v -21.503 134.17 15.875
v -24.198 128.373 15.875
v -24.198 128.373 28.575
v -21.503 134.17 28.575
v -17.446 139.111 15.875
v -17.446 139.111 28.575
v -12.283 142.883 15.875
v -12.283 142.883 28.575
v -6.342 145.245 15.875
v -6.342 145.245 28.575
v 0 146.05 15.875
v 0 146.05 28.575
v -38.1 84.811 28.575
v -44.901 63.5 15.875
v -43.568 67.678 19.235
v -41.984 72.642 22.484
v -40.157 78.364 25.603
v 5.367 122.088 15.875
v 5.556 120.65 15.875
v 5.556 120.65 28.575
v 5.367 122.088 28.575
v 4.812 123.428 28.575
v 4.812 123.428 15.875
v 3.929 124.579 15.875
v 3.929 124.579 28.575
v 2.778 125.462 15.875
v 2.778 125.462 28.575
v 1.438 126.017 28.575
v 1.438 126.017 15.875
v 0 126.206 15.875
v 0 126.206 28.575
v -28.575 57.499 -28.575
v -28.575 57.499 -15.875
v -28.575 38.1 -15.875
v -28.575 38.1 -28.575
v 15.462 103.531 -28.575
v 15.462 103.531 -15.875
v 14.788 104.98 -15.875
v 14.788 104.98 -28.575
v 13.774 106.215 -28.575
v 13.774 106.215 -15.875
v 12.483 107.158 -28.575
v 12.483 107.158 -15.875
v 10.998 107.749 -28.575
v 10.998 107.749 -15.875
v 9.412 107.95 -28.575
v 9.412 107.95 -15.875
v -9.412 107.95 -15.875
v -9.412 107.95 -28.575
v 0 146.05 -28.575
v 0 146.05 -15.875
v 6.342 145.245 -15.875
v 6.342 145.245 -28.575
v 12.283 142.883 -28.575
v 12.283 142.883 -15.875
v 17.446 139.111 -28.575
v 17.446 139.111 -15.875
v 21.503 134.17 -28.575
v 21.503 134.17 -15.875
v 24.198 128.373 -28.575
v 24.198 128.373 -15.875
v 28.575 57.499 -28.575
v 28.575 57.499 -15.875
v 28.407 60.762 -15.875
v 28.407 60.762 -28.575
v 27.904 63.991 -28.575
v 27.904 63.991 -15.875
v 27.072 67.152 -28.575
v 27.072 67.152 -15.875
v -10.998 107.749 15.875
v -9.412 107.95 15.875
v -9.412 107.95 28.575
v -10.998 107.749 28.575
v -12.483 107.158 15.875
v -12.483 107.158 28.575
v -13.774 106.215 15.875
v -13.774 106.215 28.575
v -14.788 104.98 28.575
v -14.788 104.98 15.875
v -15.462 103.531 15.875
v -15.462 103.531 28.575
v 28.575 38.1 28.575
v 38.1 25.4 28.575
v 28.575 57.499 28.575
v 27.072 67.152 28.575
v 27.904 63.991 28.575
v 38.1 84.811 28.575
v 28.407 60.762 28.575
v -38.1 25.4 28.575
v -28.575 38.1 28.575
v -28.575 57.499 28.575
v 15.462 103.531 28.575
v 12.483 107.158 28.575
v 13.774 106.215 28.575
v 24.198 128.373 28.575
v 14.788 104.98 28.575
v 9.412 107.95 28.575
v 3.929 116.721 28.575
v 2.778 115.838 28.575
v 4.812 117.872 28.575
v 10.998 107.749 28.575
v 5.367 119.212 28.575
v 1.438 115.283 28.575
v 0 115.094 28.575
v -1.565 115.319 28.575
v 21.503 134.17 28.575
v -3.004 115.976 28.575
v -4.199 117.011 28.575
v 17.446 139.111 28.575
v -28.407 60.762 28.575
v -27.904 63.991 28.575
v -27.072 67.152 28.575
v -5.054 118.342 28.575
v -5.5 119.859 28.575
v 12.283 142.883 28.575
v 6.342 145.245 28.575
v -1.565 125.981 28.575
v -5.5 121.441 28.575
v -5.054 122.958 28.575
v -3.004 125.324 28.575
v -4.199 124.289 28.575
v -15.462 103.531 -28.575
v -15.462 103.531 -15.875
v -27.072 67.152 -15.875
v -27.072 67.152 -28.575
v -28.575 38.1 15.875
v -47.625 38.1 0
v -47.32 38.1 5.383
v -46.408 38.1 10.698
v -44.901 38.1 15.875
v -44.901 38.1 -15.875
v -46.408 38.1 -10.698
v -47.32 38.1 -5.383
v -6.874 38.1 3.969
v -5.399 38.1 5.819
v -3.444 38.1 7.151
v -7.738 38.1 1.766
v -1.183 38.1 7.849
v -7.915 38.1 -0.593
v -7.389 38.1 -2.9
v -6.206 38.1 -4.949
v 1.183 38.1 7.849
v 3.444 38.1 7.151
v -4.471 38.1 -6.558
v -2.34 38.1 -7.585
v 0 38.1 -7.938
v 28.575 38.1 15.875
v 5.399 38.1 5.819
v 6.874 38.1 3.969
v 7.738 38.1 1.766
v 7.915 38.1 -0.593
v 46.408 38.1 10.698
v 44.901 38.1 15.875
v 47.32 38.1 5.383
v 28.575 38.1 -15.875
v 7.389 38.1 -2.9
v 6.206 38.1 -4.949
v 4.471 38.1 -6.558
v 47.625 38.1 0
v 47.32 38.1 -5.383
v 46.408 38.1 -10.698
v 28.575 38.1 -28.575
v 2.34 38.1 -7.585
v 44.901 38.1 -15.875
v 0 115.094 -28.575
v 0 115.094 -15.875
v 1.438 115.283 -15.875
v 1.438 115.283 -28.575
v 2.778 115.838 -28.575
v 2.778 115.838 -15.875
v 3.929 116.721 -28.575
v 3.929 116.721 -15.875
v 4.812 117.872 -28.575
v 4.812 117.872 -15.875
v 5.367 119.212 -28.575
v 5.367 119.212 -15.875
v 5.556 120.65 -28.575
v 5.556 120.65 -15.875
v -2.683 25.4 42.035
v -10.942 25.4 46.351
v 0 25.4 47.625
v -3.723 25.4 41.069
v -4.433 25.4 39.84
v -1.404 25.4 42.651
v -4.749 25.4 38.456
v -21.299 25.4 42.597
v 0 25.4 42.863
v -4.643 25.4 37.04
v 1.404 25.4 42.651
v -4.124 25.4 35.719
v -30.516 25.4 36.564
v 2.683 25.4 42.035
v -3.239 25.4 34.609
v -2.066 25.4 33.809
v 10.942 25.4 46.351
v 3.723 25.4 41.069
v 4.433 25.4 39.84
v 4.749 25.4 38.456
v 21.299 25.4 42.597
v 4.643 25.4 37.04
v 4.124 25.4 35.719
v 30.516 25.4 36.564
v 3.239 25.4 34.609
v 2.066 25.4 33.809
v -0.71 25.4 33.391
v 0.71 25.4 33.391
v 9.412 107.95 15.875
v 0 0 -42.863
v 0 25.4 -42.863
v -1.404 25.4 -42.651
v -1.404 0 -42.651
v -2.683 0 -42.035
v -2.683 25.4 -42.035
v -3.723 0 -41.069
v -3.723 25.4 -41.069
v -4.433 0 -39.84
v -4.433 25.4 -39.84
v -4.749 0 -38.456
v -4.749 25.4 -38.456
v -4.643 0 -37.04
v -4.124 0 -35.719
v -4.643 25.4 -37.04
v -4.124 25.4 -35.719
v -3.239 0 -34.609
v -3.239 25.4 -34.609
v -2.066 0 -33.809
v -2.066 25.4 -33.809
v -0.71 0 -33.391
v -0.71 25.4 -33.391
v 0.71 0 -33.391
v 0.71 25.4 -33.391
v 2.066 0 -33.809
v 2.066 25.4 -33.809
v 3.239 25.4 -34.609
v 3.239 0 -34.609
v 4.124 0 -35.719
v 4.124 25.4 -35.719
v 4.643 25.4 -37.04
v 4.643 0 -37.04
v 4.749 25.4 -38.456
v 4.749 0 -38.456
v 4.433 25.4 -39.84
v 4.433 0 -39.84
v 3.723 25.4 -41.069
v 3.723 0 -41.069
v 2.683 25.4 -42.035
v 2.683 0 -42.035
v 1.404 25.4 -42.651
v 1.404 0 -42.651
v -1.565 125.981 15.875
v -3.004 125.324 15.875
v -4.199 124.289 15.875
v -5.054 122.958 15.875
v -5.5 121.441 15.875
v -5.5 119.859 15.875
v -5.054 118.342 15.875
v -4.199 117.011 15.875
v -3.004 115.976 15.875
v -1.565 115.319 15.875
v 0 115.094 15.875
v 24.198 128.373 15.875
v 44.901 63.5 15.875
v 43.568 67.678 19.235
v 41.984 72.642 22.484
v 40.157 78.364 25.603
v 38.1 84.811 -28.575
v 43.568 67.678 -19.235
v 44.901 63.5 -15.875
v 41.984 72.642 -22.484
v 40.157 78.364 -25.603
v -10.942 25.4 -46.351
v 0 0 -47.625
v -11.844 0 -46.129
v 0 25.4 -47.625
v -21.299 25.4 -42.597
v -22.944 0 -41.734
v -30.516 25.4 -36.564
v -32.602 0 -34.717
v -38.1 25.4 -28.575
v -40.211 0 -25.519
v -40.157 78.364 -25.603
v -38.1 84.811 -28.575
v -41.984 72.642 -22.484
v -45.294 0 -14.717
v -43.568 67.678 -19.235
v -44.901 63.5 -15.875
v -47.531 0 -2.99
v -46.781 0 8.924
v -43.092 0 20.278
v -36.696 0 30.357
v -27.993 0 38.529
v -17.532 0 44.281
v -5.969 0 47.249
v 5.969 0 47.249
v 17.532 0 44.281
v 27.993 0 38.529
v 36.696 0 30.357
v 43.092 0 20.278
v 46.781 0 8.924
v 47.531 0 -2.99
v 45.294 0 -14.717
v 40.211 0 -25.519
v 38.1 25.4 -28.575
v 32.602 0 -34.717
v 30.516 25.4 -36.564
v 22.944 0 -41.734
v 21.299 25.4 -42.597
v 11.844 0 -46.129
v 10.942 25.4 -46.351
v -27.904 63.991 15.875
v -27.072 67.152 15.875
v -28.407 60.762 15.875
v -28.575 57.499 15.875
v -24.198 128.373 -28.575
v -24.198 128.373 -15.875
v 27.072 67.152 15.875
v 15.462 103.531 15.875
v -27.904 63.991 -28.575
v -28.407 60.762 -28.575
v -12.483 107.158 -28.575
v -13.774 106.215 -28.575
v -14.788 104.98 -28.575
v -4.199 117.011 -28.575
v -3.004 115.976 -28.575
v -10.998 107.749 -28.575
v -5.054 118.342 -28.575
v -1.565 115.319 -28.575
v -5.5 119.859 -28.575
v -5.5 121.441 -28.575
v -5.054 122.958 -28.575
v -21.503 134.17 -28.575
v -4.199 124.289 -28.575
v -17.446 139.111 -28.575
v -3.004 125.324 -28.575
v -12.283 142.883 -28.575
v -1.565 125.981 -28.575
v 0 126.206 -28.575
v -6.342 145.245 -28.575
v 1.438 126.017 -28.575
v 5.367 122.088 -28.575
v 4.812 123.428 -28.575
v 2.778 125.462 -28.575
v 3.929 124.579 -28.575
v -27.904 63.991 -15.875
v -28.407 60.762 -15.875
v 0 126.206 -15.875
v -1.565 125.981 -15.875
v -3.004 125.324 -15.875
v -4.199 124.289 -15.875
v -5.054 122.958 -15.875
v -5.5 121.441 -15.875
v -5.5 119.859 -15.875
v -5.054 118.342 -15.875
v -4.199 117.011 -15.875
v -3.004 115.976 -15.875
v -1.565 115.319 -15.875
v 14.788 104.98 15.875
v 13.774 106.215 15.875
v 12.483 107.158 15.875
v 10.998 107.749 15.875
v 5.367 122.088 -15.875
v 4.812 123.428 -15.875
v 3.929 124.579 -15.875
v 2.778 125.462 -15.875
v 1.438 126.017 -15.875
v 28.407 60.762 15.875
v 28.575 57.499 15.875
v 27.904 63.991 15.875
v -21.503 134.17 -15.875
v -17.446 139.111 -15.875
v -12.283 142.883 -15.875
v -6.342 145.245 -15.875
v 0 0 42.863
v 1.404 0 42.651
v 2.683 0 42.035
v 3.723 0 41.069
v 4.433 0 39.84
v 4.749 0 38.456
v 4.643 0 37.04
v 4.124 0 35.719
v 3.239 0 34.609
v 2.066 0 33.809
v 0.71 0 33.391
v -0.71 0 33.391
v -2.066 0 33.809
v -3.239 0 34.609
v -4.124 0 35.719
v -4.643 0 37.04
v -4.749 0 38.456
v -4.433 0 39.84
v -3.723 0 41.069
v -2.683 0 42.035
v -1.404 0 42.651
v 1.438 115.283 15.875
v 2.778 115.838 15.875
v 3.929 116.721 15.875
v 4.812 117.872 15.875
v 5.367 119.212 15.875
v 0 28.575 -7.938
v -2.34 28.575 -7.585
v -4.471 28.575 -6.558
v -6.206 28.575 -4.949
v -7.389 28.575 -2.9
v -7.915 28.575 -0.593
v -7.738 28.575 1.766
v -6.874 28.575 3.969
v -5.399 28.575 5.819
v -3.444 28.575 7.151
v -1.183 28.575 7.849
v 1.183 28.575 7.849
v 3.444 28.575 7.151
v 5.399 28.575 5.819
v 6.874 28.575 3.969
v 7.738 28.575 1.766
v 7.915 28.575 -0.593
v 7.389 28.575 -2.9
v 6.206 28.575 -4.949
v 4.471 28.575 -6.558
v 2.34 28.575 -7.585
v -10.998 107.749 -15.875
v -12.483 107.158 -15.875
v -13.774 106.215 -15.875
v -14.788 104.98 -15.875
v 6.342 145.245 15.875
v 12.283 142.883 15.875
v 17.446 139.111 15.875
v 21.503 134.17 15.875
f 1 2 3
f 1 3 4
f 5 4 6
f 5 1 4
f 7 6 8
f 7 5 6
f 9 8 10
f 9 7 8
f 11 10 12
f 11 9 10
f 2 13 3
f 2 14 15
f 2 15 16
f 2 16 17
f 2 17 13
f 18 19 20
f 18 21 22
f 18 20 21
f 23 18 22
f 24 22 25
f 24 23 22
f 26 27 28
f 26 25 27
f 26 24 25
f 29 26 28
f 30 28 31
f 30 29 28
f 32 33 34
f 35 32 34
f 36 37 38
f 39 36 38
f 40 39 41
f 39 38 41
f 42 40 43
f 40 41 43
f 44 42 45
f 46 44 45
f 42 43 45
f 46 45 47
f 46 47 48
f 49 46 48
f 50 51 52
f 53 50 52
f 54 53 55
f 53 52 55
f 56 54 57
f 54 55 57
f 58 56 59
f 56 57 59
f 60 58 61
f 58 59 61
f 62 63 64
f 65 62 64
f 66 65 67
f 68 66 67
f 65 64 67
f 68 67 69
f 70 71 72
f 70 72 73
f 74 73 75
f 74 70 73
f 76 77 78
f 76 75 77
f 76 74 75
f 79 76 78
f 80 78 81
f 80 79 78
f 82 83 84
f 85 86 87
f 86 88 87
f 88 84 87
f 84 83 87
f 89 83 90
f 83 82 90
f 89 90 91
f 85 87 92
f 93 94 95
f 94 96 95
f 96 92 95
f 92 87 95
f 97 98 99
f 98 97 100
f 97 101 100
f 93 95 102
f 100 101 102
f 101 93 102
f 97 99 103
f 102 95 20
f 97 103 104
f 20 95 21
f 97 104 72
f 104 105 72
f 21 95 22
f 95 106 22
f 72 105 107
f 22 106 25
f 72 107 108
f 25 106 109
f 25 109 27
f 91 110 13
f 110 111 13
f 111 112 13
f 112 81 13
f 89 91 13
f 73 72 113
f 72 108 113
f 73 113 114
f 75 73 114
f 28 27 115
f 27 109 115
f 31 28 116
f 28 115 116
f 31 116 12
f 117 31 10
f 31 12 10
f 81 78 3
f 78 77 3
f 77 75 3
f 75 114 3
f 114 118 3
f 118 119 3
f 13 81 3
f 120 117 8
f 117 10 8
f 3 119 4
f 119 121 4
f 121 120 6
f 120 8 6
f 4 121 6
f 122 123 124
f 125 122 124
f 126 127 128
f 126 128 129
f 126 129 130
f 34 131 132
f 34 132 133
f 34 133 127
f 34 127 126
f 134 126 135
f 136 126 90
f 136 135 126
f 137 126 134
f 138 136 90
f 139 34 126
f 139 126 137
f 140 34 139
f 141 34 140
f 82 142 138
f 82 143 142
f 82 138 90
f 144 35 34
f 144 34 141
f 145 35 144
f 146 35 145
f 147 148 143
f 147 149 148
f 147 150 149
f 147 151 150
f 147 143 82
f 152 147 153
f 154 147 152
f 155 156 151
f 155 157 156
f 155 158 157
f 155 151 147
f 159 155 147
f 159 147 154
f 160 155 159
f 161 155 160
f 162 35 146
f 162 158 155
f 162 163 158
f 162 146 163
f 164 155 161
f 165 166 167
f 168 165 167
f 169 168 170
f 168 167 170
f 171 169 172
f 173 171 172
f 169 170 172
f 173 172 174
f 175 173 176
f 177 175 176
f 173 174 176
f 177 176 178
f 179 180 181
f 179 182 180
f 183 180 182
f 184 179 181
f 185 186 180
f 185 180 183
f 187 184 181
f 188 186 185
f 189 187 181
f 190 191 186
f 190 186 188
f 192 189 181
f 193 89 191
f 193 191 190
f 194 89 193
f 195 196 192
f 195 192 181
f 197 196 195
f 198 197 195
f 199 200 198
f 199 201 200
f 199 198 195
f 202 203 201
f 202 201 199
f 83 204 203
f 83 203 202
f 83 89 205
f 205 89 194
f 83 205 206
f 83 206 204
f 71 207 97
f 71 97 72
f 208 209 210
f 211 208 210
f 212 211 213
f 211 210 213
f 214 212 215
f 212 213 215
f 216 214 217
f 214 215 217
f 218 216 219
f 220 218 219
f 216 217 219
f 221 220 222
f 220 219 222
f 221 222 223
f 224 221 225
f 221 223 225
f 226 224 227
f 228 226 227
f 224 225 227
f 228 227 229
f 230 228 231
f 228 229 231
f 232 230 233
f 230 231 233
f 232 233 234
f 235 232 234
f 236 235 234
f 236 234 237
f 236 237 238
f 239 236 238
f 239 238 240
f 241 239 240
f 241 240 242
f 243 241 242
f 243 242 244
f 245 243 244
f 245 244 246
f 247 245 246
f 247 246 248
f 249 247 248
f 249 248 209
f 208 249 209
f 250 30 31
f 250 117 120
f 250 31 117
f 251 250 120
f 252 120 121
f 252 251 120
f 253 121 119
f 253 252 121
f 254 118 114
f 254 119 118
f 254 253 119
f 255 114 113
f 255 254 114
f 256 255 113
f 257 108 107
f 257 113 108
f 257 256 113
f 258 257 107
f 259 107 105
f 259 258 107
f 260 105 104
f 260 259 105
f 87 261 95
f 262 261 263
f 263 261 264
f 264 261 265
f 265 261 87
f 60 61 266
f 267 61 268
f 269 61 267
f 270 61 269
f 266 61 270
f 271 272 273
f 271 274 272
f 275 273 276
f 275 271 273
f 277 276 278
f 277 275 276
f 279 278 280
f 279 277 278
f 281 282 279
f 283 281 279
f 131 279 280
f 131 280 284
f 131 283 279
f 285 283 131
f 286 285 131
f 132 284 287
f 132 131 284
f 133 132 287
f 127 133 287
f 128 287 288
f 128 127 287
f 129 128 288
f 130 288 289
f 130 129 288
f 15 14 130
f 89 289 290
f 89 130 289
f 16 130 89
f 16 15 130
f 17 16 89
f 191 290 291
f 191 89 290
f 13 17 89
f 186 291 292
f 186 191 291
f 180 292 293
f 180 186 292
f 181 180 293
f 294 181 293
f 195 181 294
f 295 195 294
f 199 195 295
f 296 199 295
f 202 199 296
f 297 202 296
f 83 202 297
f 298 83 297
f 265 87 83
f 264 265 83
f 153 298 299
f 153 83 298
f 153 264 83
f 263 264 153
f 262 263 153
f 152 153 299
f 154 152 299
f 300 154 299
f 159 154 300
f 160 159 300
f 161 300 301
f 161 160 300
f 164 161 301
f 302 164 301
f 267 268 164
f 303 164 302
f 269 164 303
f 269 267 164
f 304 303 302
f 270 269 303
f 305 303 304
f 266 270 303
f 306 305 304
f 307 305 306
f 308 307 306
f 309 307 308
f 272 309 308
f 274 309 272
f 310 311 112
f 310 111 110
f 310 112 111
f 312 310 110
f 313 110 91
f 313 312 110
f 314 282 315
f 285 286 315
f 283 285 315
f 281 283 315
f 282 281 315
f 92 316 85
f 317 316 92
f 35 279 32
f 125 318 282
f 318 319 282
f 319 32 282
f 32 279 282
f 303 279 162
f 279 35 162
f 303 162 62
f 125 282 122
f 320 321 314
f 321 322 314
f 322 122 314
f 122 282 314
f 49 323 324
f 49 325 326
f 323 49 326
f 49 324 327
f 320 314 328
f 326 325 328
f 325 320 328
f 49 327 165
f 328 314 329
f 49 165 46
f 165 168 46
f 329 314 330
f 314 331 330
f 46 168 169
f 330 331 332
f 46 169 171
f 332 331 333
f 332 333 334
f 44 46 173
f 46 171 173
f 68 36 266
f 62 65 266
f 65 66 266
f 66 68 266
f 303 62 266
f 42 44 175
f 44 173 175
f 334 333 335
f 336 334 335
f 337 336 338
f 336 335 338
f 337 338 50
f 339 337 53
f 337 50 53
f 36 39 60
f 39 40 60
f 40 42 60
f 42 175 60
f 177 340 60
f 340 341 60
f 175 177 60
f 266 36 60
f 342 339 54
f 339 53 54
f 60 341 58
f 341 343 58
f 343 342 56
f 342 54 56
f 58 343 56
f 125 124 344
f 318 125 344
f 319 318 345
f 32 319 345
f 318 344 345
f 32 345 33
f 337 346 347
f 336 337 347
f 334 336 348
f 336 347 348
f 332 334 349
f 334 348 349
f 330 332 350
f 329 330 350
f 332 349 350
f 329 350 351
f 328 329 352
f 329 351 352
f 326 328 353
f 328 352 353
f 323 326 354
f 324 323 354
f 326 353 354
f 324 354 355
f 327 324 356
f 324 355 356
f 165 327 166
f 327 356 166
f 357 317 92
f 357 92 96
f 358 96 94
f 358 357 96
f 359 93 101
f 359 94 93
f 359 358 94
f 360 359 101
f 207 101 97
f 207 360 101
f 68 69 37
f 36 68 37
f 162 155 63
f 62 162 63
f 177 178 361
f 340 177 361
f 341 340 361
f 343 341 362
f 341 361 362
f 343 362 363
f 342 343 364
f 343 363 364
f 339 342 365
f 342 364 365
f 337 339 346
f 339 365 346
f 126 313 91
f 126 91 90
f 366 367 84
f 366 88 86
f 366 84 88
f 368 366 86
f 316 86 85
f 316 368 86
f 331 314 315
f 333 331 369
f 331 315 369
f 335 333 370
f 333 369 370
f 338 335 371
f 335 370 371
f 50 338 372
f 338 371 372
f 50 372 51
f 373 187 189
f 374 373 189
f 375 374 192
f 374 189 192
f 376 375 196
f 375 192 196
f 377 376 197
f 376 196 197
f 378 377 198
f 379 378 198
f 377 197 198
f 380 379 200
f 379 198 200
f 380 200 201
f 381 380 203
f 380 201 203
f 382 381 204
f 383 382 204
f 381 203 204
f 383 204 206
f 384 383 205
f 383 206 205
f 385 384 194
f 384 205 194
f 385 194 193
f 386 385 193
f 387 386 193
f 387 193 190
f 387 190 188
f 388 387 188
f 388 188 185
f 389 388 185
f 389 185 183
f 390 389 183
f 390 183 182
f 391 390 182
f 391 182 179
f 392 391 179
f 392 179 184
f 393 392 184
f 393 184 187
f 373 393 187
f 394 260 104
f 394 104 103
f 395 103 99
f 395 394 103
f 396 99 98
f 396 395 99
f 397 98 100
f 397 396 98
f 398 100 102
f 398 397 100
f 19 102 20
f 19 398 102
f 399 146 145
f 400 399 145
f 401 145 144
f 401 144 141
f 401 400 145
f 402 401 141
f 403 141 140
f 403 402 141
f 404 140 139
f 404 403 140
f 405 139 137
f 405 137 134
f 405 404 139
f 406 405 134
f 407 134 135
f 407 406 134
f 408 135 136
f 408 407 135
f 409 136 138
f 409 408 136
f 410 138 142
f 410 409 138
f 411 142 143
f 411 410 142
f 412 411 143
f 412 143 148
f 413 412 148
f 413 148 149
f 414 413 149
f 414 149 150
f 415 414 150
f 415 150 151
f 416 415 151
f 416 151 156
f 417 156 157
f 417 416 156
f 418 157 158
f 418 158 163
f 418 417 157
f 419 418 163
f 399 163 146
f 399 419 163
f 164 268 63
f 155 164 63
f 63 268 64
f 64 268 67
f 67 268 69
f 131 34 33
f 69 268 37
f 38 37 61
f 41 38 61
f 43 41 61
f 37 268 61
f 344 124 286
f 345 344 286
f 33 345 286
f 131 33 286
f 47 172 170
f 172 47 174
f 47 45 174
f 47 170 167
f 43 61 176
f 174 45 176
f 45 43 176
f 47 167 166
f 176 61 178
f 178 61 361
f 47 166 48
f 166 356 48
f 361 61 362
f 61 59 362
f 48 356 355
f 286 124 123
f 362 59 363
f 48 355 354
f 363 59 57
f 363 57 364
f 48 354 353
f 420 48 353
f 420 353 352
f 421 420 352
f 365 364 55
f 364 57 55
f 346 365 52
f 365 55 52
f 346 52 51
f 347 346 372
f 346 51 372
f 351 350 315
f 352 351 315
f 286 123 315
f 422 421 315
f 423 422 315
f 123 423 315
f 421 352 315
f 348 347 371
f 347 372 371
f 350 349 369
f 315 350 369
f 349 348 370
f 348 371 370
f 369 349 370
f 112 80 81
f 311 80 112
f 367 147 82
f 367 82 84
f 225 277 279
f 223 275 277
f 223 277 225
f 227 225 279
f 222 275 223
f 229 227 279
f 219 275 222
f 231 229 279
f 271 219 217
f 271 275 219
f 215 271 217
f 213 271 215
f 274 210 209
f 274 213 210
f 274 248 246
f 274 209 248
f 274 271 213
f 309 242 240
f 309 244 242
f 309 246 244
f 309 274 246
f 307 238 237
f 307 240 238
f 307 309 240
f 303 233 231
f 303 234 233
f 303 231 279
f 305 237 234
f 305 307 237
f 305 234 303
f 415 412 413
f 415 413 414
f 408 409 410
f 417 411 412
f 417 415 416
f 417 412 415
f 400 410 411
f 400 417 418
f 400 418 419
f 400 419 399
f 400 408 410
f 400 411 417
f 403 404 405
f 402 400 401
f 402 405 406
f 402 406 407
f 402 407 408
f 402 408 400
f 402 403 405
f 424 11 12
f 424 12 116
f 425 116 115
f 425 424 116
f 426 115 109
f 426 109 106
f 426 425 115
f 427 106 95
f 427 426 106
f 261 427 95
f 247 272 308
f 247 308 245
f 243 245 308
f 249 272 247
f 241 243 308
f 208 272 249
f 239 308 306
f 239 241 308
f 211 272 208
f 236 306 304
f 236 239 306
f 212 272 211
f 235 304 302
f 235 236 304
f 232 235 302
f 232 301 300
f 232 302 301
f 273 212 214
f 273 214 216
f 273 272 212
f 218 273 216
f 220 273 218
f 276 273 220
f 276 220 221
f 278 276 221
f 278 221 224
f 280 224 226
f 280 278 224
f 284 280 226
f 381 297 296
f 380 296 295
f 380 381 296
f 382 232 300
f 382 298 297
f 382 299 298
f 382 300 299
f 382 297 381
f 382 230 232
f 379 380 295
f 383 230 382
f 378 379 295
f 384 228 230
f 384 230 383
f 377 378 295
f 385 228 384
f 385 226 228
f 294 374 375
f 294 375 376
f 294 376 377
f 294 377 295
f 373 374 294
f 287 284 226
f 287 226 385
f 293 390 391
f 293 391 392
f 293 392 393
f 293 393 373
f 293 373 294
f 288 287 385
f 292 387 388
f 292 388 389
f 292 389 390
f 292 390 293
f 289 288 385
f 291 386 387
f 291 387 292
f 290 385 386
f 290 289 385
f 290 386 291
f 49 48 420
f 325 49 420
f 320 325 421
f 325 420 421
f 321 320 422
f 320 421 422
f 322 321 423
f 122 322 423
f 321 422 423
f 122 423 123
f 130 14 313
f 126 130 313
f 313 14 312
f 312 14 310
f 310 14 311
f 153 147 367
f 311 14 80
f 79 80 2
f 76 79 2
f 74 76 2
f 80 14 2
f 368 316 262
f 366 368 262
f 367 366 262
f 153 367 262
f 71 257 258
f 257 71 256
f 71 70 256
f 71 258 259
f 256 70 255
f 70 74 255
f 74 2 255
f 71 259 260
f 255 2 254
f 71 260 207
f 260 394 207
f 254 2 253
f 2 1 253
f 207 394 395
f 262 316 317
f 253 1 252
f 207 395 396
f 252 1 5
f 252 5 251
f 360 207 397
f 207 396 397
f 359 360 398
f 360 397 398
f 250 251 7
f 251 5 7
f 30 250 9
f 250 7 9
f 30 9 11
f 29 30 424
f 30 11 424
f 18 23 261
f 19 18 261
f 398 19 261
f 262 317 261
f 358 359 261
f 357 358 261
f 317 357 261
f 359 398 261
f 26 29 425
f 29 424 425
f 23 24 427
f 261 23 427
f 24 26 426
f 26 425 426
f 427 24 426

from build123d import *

# Parameters (mm, degrees)
CUT_EXTRUDE1_DEPTH      = 120.65
CUT_EXTRUDE2_DEPTH      = 107.95
CUT_EXTRUDE3_DEPTH      = 167.225729431
CUT_EXTRUDE3_DEPTH_BACK = 167.225729431
SKETCH5_R               = 4.7625
CUT_EXTRUDE4_DEPTH      = 139.176350183


with BuildPart() as part:
    # Sketch1 → Revolve1 (revolve)
    with BuildSketch(Plane(origin=(0, 0, 0), x_dir=(0, 0, -1), z_dir=(1, 0, 0))):
        Polygon((0, 0), (47.625, 0), (47.625, 146.05), (0, 146.05), (0, 38.1), (7.9375, 38.1), (7.9375, 28.575), (0, 28.575), align=None)
    revolve(axis=Axis((0, 0, 0), (0, 1, 0)))

    # Sketch2 → Cut-Extrude1 (cut)
    with BuildSketch(Plane(origin=(0, 146.05, 0), x_dir=(1, 0, 0), z_dir=(0, 1, 0))):
        with BuildLine():
            ThreePointArc((38.1, 28.575), (0, 47.625), (-38.1, 28.575))
            Line((-38.1, 28.575), (38.1, 28.575))
        make_face()
        with BuildLine():
            Line((38.1, -28.575), (-38.1, -28.575))
            ThreePointArc((-38.1, -28.575), (0, -47.625), (38.1, -28.575))
        make_face()
    extrude(amount=-CUT_EXTRUDE1_DEPTH, mode=Mode.SUBTRACT)

    # Sketch2<3> → Cut-Extrude2 (cut)
    with BuildSketch(Plane(origin=(0, 146.05, 0), x_dir=(1, 0, 0), z_dir=(0, 1, 0))):
        with BuildLine():
            ThreePointArc((-44.901280605, 15.875), (-46.939131403, 8.053481737), (-47.625, 0))
            Line((-47.625, 0), (47.625, 0))
            ThreePointArc((47.625, 0), (46.939131403, 8.053481737), (44.901280605, 15.875))
            Line((44.901280605, 15.875), (-44.901280605, 15.875))
        make_face()
        with BuildLine():
            Line((47.625, 0), (-47.625, 0))
            ThreePointArc((-47.625, 0), (-46.939131403, -8.053481737), (-44.901280605, -15.875))
            Line((-44.901280605, -15.875), (44.901280605, -15.875))
            ThreePointArc((44.901280605, -15.875), (46.939131403, -8.053481737), (47.625, 0))
        make_face()
    extrude(amount=-CUT_EXTRUDE2_DEPTH, mode=Mode.SUBTRACT)

    # Sketch4 → Cut-Extrude3 (cut, two sides)
    with BuildSketch(Plane.XY.offset(-15.875)) as cut_extrude3_sk:
        with BuildLine():
            Line((-28.575, 57.498647721), (-28.575, 38.1))
            Line((-28.575, 38.1), (0, 38.1))
            Line((0, 38.1), (0, 107.95))
            Line((0, 107.95), (-9.412473661, 107.95))
            ThreePointArc((-9.412473661, 107.95), (-13.158337818, 106.72747518), (-15.461867516, 103.530630463))
            Line((-15.461867516, 103.530630463), (-27.071969275, 67.151800038))
            ThreePointArc((-27.071969275, 67.151800038), (-28.196992083, 62.38338034), (-28.575, 57.498647721))
        make_face()
        with BuildLine():
            Line((0, 107.95), (0, 38.1))
            Line((0, 38.1), (28.575, 38.1))
            Line((28.575, 38.1), (28.575, 57.498647721))
            ThreePointArc((28.575, 57.498647721), (28.196992083, 62.38338034), (27.071969275, 67.151800038))
            Line((27.071969275, 67.151800038), (15.461867516, 103.530630463))
            ThreePointArc((15.461867516, 103.530630463), (13.158337818, 106.72747518), (9.412473661, 107.95))
            Line((9.412473661, 107.95), (0, 107.95))
        make_face()
        with BuildLine():
            Line((-44.901280605, 146.05), (-44.901280605, 63.5))
            Line((-44.901280605, 63.5), (-24.19757542, 128.372521853))
            ThreePointArc((-24.19757542, 128.372521853), (-14.983456626, 141.15990072), (0, 146.05))
            Line((0, 146.05), (-44.901280605, 146.05))
        make_face()
        with BuildLine():
            Line((44.901280605, 146.05), (0, 146.05))
            ThreePointArc((0, 146.05), (14.983456626, 141.15990072), (24.19757542, 128.372521853))
            Line((24.19757542, 128.372521853), (44.901280605, 63.5))
            Line((44.901280605, 63.5), (44.901280605, 146.05))
        make_face()
        with BuildLine():
            ThreePointArc((5.55625, 120.65), (3.928862053, 124.578862053), (0, 126.20625))
            Line((0, 126.20625), (0, 115.09375))
            ThreePointArc((0, 115.09375), (3.928862053, 116.721137947), (5.55625, 120.65))
        make_face()
        with BuildLine():
            Line((0, 115.09375), (0, 126.20625))
            ThreePointArc((0, 126.20625), (-5.55625, 120.65), (0, 115.09375))
        make_face()
    extrude(amount=CUT_EXTRUDE3_DEPTH, mode=Mode.SUBTRACT)
    extrude(cut_extrude3_sk.sketch, amount=-CUT_EXTRUDE3_DEPTH_BACK, mode=Mode.SUBTRACT)

    # Sketch5 → Cut-Extrude4 (cut, through all)
    with BuildSketch(Plane(origin=(0, 25.4, 0), x_dir=(1, 0, 0), z_dir=(0, 1, 0))):
        with Locations(Location((0, -38.1, 0), (0, 0, 270))):
            Circle(SKETCH5_R)
        with Locations(Location((0, 38.1, 0), (0, 0, 90))):
            Circle(SKETCH5_R)
    extrude(amount=-CUT_EXTRUDE4_DEPTH, mode=Mode.SUBTRACT)


solid = part.part
